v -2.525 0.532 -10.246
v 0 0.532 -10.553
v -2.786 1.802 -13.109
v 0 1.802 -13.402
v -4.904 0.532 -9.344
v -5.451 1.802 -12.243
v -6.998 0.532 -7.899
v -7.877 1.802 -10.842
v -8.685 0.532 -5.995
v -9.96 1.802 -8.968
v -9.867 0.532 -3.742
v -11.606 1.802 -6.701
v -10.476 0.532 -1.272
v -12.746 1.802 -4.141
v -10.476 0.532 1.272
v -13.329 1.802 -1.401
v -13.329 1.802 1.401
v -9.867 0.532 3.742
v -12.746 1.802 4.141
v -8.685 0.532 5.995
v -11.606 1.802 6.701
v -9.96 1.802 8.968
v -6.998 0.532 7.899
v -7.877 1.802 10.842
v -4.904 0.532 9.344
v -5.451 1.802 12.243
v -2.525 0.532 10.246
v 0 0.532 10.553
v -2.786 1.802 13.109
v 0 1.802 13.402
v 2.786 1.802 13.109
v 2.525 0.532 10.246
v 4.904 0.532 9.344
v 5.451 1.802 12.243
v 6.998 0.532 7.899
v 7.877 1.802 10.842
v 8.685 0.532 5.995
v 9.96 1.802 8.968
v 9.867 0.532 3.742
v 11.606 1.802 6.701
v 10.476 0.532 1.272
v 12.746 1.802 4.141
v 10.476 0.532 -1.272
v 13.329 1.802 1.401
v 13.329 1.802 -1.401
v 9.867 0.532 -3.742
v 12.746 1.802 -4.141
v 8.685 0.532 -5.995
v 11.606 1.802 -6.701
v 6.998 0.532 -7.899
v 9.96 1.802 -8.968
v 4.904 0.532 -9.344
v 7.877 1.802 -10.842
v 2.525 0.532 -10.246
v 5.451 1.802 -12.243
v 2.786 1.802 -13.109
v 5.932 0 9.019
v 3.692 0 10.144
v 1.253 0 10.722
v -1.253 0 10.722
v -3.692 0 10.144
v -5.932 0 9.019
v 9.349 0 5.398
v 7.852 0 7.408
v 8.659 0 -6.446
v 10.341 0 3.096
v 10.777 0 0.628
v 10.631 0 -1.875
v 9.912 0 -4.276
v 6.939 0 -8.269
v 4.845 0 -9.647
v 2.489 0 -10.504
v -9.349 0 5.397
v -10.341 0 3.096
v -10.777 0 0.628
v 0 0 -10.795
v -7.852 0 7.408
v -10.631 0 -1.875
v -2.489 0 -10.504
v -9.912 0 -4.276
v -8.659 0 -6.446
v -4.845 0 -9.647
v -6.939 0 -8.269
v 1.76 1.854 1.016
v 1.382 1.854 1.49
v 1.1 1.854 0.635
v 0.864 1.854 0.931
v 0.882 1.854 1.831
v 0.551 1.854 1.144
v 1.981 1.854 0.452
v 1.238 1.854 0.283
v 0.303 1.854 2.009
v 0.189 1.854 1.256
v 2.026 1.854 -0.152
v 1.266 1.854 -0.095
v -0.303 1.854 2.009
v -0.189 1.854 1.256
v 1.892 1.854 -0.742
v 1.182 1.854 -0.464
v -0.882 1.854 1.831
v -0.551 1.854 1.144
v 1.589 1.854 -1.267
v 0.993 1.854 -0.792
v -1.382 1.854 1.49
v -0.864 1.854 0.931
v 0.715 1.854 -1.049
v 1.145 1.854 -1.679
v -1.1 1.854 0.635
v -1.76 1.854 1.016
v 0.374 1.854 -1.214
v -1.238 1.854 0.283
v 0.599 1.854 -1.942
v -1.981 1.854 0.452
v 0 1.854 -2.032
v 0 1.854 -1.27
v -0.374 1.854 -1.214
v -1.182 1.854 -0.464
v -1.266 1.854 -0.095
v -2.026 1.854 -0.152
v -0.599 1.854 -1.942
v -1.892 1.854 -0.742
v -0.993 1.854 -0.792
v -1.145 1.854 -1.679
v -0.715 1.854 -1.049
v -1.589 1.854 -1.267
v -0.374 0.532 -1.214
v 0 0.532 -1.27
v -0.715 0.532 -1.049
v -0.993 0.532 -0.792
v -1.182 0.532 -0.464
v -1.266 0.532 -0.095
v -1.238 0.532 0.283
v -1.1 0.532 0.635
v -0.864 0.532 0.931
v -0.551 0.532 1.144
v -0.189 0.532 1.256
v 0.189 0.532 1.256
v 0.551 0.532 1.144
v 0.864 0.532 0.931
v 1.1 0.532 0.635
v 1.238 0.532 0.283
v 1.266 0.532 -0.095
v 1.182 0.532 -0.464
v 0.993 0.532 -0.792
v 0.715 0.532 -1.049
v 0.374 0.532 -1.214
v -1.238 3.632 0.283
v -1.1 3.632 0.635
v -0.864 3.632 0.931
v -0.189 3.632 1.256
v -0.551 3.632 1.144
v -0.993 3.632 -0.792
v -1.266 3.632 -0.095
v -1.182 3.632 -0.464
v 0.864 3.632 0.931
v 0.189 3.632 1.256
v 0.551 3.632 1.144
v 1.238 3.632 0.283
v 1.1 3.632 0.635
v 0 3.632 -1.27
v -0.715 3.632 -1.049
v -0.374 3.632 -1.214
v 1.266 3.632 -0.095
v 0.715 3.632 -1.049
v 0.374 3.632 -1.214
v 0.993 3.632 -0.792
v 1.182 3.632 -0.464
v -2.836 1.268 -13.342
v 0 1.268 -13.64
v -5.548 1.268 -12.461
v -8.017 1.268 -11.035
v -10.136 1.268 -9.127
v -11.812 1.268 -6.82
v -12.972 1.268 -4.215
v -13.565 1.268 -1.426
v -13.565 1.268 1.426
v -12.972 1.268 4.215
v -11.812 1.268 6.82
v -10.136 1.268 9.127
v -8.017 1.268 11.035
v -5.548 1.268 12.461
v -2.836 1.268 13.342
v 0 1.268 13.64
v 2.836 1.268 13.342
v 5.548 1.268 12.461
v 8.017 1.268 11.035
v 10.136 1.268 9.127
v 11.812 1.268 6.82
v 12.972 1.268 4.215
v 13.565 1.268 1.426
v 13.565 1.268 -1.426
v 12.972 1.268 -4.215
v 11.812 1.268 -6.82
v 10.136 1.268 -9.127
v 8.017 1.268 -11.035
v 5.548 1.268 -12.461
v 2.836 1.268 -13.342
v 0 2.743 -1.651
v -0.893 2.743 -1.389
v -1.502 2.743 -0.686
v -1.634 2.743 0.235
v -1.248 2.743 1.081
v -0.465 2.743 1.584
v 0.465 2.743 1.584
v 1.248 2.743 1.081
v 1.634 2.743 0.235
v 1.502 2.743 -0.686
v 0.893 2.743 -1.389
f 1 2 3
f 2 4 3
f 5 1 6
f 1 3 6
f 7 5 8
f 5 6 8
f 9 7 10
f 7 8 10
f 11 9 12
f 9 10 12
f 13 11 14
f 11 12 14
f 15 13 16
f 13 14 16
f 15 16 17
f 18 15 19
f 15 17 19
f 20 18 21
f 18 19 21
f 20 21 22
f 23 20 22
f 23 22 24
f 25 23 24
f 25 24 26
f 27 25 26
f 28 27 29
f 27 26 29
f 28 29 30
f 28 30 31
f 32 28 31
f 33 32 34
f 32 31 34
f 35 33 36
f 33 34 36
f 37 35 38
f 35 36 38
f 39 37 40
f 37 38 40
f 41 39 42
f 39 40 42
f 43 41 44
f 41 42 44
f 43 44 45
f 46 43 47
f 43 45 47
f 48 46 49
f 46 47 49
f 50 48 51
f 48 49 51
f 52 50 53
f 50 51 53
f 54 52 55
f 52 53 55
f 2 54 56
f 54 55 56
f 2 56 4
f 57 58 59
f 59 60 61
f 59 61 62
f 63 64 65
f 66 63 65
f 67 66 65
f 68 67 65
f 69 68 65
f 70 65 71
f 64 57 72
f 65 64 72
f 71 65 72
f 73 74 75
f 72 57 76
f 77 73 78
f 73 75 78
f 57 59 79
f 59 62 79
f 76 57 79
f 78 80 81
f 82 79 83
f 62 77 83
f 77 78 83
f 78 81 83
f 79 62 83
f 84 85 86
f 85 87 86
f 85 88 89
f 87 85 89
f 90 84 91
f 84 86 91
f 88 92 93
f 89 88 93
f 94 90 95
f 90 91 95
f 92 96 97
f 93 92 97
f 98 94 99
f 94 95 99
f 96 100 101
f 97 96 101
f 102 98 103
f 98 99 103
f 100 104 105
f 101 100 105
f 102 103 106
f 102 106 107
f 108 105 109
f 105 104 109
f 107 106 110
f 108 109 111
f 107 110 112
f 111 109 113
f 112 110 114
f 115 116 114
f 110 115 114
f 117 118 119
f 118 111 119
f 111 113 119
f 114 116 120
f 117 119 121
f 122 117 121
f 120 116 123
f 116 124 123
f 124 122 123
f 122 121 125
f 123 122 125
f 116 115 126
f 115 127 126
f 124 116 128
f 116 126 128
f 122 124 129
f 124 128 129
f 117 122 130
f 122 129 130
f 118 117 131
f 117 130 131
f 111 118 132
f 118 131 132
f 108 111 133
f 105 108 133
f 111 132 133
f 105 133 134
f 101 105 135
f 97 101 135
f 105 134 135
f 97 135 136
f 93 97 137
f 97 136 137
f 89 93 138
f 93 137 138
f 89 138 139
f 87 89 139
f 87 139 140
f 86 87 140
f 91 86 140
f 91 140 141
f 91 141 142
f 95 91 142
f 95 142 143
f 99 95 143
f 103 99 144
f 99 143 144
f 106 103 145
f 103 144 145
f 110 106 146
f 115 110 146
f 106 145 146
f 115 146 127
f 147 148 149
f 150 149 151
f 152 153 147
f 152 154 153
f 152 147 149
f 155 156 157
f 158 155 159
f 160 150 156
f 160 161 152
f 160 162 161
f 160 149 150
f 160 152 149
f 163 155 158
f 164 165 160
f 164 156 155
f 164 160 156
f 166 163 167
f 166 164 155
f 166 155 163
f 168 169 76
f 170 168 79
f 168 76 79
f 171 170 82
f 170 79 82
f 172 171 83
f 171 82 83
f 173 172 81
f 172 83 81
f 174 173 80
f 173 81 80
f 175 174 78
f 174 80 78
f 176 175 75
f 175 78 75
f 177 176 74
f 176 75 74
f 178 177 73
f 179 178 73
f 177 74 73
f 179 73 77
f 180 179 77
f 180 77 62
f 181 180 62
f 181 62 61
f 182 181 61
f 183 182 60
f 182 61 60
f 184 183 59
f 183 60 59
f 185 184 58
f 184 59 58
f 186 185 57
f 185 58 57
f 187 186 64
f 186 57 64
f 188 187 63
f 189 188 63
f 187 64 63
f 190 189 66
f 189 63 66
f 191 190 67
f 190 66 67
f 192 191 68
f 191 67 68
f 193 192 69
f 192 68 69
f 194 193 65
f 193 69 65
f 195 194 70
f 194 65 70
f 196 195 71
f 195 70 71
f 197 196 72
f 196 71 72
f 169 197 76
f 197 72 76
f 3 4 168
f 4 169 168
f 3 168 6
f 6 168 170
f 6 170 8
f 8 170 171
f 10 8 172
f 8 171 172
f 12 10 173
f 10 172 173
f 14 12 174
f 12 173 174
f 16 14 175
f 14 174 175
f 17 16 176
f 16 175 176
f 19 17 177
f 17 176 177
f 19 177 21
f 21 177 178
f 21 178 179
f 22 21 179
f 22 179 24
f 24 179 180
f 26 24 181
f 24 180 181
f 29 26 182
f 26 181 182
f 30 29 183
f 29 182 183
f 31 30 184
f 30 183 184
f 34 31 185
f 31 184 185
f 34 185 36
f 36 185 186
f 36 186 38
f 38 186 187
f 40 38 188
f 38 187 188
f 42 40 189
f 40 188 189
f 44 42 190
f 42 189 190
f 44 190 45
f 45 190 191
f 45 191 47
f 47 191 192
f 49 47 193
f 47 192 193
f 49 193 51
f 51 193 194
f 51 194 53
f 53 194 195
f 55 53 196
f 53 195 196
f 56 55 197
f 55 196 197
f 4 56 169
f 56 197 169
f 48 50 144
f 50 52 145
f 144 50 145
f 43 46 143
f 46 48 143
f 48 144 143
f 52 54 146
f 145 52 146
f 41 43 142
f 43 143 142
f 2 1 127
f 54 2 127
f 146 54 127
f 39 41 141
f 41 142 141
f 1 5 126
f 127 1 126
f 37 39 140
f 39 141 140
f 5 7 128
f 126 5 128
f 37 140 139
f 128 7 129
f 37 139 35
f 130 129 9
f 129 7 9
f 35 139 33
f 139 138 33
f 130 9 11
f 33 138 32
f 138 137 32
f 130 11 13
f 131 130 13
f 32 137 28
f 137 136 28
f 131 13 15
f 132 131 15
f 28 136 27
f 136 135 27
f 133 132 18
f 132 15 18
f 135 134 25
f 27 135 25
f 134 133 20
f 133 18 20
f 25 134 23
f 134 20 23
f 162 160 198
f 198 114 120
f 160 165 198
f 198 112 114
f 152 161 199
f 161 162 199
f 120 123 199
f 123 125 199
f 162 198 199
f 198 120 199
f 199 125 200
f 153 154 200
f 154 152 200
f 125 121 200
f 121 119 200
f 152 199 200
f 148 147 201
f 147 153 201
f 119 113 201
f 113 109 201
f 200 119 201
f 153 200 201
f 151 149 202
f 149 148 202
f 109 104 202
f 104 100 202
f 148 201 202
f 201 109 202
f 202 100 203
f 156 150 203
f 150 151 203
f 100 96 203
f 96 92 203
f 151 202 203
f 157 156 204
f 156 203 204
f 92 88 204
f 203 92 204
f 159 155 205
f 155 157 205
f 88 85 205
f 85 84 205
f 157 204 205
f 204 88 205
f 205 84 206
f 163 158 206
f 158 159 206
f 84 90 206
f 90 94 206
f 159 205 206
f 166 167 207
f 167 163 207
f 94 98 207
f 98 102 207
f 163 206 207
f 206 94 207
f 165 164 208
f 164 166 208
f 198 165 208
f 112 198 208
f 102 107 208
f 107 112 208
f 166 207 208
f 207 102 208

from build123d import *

# Parameters (mm, degrees)
CUT_EXTRUDE1_DEPTH      = 26.275067654
CUT_EXTRUDE1_DEPTH_BACK = 26.275067654
SKETCH3_W               = 2.54
SKETCH3_H               = 12.7


with BuildPart() as part:
    # Sketch2 → Base-Revolve (revolve)
    with BuildSketch(Plane.XY, mode=Mode.PRIVATE) as base_revolve_sk:
        Polygon((0, 0), (0, 16.3322), (1.27, 16.3322), (1.27, 3.6322), (2.032, 1.8542), (1.27, 1.8542), (1.27, 0.531702223), (10.552917766, 0.531702223), (13.401945131, 1.801702223), (13.6398, 1.268115584), (10.795, 0), align=None)
    revolve(base_revolve_sk.sketch.rotate(Axis((0, 0, 0), (0, 1, 0)), 90), axis=Axis((0, 0, 0), (0, 1, 0)))

    # Sketch3 → Cut-Extrude1 (cut, two sides: drawn at the far end of the back side and taken through both)
    with BuildSketch(Plane.XY.offset(-CUT_EXTRUDE1_DEPTH_BACK)):
        with Locations((0, 9.9822)):
            Rectangle(SKETCH3_W, SKETCH3_H)
    extrude(amount=CUT_EXTRUDE1_DEPTH + CUT_EXTRUDE1_DEPTH_BACK, mode=Mode.SUBTRACT)


solid = part.part
